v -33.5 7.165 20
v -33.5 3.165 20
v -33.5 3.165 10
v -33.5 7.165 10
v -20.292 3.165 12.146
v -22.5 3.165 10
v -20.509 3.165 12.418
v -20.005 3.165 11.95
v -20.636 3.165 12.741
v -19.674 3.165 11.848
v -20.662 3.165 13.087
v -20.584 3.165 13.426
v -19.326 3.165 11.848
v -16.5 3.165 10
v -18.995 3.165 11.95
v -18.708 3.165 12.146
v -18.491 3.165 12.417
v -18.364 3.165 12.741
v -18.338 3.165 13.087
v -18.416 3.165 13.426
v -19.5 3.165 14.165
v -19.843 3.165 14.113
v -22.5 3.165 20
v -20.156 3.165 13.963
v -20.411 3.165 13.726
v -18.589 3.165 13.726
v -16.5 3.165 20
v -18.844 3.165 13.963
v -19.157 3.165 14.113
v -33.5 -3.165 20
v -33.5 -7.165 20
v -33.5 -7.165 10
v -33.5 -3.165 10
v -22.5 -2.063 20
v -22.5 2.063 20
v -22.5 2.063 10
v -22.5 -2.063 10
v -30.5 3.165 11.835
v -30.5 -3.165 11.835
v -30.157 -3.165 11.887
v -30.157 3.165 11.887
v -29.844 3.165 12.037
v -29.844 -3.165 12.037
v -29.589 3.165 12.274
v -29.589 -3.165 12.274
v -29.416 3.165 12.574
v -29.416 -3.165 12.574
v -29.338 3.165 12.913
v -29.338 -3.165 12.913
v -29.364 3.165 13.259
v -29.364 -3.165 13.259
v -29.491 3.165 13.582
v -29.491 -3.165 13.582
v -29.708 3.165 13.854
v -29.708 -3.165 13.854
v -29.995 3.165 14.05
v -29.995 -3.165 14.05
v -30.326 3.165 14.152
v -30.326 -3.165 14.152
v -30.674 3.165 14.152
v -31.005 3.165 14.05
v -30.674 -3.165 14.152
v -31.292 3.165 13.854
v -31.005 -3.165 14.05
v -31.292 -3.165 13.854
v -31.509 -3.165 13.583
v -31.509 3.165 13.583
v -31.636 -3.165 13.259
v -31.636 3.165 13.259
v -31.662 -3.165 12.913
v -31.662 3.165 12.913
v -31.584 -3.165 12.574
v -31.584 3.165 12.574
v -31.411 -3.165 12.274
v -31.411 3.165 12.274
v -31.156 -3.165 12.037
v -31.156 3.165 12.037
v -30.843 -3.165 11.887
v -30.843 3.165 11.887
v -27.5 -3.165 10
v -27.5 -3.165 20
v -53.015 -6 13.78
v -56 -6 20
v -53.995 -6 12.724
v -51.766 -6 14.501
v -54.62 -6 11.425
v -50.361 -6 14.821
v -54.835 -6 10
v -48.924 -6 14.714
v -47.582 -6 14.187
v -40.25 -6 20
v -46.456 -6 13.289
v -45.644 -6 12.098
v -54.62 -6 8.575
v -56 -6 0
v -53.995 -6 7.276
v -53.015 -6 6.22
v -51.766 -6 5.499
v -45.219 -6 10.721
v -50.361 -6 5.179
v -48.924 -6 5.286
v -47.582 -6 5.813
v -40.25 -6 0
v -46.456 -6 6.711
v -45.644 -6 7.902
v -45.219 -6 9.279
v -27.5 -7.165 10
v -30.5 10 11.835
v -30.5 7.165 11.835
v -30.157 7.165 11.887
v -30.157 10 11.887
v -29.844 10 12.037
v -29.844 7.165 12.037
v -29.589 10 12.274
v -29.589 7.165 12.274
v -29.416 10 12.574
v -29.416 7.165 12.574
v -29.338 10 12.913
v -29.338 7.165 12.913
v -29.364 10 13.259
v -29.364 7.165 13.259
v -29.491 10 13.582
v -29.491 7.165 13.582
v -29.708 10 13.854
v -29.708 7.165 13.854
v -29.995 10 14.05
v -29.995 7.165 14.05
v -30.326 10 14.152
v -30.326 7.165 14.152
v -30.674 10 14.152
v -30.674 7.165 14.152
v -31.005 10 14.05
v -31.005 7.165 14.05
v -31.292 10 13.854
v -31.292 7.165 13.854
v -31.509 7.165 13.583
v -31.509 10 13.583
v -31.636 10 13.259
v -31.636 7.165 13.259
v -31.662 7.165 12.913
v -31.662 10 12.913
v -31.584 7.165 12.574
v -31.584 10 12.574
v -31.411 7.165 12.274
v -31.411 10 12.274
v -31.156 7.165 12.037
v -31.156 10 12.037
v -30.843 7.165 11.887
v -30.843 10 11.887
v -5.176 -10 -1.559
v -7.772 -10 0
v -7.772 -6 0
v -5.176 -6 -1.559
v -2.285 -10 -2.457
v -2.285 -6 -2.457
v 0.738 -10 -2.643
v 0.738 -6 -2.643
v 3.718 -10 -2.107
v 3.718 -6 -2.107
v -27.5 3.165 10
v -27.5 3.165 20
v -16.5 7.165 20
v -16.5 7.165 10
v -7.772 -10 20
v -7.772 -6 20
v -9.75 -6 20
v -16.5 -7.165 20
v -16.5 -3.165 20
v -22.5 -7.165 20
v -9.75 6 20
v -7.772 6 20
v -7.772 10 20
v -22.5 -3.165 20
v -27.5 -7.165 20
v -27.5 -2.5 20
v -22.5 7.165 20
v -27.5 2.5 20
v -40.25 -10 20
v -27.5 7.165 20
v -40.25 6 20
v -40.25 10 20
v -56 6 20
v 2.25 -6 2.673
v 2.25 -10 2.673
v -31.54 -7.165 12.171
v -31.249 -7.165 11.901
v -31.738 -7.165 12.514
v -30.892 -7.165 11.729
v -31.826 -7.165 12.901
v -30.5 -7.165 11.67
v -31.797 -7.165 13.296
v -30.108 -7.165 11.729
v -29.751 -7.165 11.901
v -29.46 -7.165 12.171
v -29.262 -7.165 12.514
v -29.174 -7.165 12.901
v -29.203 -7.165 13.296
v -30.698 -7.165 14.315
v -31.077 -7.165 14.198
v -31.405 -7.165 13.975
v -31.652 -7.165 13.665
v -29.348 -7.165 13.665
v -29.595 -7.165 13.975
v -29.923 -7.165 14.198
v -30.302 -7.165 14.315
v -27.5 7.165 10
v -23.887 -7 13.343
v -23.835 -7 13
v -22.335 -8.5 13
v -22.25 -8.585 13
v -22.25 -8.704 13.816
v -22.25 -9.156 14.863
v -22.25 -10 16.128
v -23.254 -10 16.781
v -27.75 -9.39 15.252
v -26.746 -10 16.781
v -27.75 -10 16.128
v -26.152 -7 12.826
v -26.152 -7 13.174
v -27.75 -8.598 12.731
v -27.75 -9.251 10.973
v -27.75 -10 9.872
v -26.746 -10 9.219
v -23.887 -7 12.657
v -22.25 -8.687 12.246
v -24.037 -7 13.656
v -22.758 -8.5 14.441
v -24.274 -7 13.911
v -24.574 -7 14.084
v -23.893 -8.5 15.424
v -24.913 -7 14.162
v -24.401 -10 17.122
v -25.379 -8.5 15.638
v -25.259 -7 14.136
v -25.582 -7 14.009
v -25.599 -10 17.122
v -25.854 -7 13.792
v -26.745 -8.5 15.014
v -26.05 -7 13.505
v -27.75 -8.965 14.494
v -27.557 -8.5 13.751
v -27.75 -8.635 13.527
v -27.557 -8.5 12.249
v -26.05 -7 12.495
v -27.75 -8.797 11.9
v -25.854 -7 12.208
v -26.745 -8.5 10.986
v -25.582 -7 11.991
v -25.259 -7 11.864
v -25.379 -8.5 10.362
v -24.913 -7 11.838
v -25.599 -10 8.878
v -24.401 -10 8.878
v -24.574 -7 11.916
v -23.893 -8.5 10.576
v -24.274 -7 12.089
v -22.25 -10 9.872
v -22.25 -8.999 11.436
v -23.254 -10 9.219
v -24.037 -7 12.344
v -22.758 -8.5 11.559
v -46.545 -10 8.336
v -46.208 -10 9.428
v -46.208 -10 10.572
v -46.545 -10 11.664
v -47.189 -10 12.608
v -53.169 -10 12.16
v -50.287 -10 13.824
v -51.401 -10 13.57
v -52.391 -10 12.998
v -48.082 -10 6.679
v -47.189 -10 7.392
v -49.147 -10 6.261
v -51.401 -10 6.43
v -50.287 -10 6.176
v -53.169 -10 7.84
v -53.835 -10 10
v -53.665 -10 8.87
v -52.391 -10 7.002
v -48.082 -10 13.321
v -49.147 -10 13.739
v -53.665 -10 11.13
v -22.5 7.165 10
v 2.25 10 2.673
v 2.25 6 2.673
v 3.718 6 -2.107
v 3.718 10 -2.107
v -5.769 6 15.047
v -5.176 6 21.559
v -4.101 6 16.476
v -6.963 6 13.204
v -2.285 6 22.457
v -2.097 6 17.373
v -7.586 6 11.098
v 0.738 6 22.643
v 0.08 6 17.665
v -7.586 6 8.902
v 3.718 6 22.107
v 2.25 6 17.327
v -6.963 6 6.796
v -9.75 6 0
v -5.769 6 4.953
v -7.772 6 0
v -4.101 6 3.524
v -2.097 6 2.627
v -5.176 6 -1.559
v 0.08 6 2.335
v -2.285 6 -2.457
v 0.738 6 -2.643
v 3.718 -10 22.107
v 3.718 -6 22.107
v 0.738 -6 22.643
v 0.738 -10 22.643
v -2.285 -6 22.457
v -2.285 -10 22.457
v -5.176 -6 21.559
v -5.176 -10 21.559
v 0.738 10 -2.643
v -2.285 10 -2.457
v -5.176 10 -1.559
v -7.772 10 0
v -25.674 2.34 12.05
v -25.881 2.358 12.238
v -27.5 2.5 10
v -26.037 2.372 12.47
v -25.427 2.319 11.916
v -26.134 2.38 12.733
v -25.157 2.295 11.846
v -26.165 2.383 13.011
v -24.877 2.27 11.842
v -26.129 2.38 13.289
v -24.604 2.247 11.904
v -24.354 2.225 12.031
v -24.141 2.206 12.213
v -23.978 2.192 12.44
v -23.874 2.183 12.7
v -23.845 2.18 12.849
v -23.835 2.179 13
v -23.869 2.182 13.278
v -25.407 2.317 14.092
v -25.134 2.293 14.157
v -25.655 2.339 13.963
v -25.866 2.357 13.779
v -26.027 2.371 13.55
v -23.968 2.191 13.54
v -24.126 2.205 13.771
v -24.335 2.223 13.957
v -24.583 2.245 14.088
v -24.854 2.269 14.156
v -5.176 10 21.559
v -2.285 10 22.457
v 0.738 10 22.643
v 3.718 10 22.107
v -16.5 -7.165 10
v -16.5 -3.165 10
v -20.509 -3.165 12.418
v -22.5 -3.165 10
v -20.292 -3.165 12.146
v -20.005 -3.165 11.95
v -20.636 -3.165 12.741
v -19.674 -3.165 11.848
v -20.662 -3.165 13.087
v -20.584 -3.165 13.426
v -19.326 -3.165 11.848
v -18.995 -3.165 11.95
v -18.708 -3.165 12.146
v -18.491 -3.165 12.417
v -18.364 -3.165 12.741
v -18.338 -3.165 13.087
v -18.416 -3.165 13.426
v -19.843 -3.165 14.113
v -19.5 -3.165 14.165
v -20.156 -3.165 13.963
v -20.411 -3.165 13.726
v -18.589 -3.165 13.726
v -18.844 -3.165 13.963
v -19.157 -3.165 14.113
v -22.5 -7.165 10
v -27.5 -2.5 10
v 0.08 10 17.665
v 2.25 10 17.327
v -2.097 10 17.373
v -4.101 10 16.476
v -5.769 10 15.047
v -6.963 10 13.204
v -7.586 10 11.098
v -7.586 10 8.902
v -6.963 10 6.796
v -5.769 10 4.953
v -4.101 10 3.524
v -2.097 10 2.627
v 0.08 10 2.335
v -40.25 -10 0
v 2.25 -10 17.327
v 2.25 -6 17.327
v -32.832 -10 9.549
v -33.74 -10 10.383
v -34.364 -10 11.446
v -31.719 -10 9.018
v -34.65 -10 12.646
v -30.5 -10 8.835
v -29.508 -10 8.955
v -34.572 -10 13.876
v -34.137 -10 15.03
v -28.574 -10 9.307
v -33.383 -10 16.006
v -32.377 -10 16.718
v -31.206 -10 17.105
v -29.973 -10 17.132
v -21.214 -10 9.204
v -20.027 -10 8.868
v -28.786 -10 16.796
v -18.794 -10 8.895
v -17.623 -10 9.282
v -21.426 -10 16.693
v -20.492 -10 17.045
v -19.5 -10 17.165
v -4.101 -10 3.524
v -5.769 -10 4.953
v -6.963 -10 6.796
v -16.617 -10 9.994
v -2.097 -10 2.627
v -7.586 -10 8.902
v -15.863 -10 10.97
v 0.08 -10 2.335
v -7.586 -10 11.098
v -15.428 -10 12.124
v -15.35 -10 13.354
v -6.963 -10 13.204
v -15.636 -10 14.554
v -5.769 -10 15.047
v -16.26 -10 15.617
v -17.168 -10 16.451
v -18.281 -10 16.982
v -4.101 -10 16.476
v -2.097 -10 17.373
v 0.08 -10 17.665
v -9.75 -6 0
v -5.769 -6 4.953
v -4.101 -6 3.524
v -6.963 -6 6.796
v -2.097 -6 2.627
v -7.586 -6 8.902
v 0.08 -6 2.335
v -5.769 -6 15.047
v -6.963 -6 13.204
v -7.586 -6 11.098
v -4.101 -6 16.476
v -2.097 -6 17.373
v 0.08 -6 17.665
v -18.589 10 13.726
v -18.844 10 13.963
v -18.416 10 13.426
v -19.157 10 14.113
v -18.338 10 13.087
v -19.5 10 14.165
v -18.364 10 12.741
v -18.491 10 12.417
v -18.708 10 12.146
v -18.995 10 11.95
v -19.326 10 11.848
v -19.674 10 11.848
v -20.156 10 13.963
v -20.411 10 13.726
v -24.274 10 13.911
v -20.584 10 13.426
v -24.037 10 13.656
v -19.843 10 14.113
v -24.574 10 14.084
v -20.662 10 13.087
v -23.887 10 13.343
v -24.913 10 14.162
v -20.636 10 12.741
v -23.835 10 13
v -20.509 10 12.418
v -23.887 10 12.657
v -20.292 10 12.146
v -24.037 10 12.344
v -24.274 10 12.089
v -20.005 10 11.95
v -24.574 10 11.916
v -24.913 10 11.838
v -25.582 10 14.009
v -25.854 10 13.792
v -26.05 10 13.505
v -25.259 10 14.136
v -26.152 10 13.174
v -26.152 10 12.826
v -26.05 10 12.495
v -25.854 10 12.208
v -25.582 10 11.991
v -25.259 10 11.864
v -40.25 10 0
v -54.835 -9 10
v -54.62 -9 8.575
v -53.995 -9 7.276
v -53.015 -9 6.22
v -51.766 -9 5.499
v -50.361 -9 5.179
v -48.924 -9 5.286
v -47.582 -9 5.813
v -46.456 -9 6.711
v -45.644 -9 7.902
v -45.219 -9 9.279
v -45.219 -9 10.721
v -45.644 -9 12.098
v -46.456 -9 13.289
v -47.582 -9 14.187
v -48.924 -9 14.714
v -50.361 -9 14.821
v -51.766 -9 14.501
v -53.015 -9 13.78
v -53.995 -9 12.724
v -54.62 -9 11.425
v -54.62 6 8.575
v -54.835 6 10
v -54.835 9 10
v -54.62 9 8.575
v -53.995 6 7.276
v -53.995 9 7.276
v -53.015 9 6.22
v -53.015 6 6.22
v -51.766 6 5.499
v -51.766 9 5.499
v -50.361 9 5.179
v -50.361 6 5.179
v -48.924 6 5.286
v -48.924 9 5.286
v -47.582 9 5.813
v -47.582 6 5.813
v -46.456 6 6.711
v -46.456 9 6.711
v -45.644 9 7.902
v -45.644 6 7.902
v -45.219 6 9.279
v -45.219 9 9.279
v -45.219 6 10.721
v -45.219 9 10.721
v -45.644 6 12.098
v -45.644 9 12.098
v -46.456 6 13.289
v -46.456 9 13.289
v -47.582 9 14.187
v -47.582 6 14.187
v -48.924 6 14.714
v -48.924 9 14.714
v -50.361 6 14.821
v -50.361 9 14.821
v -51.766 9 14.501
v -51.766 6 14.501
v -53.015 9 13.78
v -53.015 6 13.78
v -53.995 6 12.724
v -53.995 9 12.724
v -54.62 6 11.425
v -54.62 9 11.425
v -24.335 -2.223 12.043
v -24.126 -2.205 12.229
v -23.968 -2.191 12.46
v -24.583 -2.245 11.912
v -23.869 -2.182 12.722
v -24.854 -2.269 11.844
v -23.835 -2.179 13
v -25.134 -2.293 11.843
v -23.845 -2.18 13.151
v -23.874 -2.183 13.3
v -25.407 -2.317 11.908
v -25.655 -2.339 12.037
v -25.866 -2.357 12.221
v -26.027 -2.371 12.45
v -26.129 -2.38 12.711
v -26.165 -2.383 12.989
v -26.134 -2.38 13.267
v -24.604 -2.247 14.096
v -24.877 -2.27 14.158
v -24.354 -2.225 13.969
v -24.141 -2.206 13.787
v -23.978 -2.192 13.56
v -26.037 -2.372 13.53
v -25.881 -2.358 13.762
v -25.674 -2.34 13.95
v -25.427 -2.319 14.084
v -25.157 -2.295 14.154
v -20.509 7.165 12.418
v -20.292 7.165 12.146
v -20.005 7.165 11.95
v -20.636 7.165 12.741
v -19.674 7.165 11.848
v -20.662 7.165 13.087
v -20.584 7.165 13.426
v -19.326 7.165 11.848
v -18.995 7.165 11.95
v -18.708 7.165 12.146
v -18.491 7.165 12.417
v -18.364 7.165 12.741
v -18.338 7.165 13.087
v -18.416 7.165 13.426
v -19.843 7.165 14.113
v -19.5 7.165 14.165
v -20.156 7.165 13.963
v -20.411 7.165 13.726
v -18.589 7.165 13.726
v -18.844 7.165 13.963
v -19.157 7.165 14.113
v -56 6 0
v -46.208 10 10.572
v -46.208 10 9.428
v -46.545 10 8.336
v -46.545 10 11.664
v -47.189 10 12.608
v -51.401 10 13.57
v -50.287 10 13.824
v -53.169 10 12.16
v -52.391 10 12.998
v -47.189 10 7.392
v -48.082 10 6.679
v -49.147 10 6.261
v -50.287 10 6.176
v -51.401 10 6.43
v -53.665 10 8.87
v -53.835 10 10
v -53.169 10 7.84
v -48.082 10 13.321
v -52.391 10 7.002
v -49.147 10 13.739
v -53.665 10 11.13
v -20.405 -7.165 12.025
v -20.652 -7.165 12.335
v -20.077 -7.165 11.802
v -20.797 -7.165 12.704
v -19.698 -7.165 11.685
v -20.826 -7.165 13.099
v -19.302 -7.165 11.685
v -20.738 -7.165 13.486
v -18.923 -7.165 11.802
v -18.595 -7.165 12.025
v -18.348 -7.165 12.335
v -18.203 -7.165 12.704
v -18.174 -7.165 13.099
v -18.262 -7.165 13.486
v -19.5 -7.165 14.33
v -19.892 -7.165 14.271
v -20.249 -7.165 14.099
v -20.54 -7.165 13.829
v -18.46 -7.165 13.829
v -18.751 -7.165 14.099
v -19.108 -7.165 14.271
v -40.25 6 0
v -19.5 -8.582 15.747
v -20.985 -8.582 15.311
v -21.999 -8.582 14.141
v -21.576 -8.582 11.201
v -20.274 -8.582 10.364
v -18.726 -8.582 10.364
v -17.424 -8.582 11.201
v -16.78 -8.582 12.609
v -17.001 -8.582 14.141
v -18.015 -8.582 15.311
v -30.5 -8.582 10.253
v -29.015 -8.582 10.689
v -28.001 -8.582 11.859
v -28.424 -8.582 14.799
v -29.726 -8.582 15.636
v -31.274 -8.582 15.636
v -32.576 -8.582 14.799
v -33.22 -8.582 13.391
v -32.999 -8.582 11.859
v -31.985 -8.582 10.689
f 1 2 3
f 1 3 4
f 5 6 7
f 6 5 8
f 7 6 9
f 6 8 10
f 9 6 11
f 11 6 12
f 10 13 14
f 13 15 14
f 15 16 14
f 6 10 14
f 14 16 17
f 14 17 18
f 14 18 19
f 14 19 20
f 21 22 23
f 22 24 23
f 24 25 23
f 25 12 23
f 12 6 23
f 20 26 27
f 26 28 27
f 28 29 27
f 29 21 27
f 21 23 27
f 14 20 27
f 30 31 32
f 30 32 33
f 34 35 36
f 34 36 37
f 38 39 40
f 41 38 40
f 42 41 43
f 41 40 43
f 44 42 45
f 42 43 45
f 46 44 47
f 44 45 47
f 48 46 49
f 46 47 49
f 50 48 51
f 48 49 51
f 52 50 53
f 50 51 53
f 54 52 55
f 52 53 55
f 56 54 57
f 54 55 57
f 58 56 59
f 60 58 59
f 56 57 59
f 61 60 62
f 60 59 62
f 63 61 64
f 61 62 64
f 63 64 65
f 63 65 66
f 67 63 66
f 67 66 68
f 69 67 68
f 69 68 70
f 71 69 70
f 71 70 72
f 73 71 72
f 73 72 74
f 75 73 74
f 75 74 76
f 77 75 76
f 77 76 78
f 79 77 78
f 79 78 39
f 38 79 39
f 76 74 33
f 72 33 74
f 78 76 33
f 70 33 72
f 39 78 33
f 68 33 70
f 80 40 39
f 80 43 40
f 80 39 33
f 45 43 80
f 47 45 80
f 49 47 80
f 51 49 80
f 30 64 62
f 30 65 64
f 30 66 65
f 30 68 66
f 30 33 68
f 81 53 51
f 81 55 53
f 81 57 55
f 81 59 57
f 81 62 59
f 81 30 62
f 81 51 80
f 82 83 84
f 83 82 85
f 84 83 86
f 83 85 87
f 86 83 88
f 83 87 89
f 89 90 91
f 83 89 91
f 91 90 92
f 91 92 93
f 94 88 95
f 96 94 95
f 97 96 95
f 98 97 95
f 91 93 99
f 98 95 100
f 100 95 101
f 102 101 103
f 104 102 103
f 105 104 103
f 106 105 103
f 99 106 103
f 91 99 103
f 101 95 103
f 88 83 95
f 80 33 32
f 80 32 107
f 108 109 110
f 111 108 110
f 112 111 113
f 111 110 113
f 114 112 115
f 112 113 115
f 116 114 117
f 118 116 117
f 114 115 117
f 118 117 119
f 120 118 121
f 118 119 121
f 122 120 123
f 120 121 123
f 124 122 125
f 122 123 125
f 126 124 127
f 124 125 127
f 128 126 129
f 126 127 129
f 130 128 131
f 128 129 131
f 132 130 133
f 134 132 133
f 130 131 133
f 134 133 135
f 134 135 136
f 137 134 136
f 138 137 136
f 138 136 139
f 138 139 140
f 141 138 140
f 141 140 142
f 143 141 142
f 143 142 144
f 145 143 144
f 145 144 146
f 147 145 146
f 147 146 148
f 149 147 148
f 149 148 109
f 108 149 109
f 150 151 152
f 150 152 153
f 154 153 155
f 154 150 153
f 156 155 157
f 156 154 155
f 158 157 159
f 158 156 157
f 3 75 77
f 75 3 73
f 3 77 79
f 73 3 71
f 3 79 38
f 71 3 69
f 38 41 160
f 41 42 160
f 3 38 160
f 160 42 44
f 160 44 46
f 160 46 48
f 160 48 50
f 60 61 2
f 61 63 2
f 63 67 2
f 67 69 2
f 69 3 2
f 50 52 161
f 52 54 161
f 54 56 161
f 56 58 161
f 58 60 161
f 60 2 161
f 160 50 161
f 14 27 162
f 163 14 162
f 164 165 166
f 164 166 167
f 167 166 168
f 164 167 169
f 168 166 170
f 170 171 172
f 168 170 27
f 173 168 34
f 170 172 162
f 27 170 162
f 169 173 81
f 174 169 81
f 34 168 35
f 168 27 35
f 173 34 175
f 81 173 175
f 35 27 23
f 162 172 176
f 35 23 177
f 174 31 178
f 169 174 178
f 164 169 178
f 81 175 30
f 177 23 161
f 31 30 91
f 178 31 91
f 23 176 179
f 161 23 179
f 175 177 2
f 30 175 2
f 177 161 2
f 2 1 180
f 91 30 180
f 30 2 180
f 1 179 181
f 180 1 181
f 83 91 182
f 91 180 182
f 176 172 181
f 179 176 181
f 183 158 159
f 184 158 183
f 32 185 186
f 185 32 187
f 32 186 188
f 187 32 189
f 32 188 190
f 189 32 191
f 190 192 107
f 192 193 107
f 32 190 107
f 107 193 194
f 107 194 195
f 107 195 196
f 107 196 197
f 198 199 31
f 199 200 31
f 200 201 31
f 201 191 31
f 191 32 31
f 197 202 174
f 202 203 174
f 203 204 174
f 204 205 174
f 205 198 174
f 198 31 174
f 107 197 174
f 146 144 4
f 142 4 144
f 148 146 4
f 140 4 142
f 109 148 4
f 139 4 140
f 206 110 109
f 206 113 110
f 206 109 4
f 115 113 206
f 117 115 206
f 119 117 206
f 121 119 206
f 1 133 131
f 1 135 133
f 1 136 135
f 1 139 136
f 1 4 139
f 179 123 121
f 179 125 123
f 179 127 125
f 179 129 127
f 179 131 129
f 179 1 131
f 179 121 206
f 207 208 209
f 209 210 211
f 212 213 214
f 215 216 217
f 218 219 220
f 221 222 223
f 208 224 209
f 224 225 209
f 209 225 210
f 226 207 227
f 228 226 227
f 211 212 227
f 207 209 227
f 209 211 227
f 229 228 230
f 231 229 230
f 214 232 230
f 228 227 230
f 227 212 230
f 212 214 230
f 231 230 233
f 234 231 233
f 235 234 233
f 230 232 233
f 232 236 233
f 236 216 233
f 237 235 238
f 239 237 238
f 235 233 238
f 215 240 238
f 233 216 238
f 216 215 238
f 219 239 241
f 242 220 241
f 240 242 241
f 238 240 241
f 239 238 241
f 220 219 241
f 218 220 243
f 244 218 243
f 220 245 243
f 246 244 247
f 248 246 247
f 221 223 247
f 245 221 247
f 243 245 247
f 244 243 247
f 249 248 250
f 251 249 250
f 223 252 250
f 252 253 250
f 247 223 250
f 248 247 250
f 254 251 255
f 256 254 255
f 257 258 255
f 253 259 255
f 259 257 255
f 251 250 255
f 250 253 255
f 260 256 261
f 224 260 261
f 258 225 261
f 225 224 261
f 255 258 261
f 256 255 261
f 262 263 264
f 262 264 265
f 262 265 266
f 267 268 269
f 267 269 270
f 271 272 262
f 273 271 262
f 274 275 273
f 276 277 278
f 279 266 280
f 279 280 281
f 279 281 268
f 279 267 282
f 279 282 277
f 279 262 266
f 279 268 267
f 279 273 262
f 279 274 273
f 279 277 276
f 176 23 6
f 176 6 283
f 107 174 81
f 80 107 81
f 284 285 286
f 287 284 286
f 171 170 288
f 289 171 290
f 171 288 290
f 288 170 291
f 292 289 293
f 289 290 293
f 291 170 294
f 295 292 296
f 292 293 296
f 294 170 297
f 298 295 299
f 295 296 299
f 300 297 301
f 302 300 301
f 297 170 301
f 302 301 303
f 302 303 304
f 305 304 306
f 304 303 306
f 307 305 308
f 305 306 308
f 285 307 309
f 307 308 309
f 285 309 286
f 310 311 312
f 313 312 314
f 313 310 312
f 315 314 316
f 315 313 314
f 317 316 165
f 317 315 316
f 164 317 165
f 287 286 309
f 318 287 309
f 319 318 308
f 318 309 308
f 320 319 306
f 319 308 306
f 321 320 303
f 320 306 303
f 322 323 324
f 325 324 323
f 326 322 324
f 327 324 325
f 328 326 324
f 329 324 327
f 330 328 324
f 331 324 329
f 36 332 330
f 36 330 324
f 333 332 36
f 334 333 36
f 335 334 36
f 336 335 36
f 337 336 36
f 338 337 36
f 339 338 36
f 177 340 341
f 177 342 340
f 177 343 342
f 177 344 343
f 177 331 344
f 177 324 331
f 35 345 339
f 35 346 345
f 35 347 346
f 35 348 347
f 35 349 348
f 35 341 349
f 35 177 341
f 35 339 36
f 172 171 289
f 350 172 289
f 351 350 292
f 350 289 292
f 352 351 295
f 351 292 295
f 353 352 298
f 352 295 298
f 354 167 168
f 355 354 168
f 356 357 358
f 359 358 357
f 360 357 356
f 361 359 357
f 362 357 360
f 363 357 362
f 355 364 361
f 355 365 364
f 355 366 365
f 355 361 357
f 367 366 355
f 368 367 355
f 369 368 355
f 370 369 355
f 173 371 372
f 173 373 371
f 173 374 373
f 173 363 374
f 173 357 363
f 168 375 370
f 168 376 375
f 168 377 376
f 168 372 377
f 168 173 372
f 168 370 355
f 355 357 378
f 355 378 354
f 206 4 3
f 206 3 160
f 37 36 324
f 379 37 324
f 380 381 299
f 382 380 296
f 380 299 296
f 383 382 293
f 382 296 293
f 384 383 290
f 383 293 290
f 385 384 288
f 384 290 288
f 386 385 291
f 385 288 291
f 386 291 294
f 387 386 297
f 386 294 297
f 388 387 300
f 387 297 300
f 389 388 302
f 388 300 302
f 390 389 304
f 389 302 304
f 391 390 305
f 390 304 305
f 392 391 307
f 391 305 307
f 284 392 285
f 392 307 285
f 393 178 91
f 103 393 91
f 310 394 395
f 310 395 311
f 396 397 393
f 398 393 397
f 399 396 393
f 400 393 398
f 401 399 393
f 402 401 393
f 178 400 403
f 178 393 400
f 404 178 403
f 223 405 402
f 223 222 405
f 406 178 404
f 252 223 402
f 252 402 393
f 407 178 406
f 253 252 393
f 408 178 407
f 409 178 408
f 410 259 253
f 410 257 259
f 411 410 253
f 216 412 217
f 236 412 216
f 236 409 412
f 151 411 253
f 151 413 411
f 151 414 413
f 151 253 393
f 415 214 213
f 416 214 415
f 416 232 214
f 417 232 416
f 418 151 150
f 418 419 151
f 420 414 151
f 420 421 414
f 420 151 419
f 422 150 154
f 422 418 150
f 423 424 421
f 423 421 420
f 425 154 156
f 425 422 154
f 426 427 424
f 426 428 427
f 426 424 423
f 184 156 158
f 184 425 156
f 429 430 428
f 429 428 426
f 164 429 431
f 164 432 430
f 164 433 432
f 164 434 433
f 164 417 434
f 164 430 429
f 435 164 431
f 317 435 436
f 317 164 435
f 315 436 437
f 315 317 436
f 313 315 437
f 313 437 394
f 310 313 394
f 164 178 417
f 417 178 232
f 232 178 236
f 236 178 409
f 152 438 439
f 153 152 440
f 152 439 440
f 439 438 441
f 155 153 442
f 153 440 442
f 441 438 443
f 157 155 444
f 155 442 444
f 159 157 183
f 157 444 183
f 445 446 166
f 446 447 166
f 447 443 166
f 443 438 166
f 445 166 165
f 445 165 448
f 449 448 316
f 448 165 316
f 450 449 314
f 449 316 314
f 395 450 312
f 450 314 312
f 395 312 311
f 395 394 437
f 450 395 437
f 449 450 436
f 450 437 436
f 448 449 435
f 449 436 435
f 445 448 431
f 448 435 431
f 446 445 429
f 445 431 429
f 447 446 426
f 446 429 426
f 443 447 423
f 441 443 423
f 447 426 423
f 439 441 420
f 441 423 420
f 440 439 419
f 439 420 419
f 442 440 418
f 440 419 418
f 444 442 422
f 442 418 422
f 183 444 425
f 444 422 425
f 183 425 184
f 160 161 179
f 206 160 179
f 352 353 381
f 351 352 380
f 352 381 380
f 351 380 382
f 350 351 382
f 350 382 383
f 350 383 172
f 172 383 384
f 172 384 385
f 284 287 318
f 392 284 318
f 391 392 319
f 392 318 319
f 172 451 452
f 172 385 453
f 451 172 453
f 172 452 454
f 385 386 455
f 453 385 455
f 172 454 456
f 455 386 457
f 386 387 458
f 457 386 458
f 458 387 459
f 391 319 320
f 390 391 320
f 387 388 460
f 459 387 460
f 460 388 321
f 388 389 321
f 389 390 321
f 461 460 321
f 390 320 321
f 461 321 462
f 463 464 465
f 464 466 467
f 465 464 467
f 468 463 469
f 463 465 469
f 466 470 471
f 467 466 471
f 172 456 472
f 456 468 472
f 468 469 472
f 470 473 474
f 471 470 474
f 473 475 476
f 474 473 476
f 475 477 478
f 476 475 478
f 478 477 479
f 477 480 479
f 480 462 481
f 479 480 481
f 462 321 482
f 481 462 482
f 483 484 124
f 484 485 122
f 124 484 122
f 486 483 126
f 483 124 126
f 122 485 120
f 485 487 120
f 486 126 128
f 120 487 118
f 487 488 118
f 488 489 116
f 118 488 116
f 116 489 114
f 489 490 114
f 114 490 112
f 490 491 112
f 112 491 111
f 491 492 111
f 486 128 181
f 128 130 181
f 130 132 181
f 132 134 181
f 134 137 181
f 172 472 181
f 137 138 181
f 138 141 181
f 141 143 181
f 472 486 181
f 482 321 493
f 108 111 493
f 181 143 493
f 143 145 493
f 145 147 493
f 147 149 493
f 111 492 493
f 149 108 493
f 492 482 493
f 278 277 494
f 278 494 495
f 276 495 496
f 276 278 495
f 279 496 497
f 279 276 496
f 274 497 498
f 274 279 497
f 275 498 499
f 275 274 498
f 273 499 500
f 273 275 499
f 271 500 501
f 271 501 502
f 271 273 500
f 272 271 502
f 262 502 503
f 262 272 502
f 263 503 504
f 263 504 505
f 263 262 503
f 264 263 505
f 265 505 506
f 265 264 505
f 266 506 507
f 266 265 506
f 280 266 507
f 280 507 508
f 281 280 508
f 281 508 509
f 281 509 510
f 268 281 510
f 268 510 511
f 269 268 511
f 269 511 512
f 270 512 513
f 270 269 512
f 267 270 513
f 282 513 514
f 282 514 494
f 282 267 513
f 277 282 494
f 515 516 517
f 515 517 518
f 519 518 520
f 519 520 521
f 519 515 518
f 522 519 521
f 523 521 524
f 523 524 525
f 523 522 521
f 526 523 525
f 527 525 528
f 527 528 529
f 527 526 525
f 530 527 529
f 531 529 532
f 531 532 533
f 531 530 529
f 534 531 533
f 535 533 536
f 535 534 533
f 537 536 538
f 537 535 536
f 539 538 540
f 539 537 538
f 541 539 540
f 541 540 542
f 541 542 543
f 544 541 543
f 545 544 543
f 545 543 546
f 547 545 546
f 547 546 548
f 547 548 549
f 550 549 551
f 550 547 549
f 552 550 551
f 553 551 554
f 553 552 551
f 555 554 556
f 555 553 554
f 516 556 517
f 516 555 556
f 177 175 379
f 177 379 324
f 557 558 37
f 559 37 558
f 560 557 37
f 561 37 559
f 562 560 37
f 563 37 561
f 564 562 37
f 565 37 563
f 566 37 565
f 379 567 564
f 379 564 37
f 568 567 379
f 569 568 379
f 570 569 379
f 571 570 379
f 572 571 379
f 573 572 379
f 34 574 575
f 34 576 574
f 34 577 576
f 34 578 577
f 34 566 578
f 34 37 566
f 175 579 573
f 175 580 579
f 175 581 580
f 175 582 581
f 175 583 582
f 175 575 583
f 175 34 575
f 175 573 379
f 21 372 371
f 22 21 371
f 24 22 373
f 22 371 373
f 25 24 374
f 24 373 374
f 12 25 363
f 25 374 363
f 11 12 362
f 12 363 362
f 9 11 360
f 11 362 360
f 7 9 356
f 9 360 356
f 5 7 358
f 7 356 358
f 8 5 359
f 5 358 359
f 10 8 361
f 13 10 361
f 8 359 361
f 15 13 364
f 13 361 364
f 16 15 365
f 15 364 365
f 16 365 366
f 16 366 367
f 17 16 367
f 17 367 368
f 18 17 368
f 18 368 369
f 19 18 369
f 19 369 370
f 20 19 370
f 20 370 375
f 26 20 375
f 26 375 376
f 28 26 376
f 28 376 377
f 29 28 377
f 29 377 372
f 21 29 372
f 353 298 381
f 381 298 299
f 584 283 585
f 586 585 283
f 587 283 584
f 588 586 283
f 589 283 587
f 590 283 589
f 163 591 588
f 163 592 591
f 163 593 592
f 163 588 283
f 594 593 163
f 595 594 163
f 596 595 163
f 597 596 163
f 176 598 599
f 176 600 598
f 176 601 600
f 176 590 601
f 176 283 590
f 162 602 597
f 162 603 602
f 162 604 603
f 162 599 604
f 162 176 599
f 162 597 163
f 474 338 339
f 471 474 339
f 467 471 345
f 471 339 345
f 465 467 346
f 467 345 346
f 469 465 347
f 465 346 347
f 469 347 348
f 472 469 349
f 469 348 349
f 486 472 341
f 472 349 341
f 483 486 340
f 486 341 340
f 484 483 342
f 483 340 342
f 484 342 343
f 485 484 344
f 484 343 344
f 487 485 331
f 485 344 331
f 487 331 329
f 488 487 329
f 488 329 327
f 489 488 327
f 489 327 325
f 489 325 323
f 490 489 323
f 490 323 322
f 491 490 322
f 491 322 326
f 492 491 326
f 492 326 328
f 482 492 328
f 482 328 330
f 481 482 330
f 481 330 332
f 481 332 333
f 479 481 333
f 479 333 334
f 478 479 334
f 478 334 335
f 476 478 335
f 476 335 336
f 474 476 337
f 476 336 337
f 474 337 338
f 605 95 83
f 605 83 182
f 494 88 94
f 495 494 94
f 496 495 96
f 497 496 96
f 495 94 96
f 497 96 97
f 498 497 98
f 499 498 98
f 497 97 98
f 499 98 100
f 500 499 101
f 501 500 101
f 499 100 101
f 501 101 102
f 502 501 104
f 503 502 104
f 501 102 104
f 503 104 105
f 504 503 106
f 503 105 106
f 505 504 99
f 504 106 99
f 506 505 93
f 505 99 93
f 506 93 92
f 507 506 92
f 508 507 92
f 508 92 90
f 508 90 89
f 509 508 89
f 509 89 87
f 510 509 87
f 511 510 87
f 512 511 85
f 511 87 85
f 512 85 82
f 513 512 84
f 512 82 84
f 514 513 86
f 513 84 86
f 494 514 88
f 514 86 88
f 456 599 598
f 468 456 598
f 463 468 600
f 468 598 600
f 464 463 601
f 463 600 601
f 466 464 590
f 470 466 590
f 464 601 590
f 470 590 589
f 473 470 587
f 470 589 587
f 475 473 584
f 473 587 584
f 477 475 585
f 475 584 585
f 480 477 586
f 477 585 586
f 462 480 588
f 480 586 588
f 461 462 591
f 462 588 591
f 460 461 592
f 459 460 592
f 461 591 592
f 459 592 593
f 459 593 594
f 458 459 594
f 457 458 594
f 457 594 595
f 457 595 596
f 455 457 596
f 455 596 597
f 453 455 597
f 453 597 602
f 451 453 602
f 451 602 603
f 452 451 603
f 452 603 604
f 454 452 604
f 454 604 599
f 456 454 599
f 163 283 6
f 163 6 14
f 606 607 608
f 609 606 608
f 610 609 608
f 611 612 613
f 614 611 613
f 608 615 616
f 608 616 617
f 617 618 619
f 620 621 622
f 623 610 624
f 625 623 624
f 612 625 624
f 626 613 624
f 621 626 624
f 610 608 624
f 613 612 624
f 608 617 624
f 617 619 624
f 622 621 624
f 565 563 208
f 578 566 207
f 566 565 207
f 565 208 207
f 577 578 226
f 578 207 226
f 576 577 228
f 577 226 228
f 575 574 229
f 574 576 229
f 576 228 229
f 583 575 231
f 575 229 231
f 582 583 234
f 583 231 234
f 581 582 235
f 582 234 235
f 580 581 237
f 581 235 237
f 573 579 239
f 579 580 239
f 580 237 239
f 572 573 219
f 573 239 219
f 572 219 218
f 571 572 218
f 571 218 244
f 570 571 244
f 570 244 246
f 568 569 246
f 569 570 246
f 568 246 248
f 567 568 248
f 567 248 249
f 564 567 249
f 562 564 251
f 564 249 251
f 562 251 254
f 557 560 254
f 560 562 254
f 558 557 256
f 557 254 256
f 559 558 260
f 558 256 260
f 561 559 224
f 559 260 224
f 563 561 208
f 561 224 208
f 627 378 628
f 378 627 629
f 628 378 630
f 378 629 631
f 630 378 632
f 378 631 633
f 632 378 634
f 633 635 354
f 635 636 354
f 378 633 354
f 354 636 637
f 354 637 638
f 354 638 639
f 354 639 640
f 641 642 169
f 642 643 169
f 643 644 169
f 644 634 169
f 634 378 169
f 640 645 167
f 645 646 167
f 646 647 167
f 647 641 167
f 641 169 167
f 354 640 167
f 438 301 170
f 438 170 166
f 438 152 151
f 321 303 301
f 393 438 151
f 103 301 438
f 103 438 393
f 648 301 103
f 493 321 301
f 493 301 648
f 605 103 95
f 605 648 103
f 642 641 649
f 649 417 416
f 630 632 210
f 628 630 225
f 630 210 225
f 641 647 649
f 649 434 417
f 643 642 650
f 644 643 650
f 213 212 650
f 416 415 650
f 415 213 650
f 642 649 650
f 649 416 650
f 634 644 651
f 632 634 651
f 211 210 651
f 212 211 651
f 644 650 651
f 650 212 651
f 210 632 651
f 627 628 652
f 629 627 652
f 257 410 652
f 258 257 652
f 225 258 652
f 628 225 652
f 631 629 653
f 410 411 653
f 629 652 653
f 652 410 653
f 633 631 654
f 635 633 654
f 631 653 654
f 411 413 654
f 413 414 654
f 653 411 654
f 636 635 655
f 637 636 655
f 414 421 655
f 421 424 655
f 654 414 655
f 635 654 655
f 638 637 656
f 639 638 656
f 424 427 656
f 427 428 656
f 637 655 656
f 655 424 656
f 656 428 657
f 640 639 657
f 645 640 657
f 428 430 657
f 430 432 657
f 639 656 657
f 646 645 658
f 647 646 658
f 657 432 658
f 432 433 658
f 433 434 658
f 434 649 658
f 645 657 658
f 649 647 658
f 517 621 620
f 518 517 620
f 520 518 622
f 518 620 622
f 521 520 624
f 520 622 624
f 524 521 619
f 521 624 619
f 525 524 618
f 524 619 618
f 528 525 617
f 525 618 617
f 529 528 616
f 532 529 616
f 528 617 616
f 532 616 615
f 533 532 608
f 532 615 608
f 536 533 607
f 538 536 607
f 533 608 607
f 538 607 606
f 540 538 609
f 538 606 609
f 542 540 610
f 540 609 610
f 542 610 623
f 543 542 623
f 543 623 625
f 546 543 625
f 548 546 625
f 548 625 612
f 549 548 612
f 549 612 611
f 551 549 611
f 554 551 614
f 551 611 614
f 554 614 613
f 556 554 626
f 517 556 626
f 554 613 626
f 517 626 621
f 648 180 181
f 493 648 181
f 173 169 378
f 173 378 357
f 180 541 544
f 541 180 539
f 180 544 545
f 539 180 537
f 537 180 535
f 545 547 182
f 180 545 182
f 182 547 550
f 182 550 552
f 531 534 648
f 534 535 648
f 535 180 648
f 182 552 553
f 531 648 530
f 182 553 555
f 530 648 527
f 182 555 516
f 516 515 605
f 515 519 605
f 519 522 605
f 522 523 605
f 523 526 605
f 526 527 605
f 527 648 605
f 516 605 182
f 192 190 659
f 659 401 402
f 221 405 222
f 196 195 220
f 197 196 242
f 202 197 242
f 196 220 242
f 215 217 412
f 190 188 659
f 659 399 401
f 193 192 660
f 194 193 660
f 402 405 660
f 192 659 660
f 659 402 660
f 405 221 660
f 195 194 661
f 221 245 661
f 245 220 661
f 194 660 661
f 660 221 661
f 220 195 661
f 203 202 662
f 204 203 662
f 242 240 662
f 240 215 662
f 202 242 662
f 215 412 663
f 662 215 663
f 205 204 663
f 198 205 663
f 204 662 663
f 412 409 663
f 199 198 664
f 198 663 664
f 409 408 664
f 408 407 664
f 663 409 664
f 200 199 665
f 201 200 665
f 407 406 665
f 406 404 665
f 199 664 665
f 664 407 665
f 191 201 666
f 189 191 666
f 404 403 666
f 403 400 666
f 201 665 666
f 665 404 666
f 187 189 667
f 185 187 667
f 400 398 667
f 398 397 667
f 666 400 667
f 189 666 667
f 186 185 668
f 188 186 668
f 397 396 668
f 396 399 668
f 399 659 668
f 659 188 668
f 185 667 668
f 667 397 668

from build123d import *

# Parameters (mm, degrees)
BOSS_EXTRUDE1_DEPTH = 20
SKETCH2_R           = 4.835
BOSS_EXTRUDE2_DEPTH = 4
CUT_EXTRUDE1_REACH  = 64.738
SKETCH3_R           = 7.665
CUT_EXTRUDE2_DEPTH  = 10
SKETCH5_W           = 6
SKETCH5_H           = 4
CUT_EXTRUDE3_DEPTH  = 10
CUT_EXTRUDE4_REACH  = 64.738
SKETCH6_R           = 1.165
BOSS_EXTRUDE4_DEPTH = 4
BOSS_EXTRUDE5_START = -4
BOSS_EXTRUDE5_DEPTH = 4
CHAMFER1_SIZE       = 3
CHAMFER2_SIZE       = 1
CHAMFER3_SIZE       = 1


with BuildPart() as part:
    # Sketch1 → Boss-Extrude1 (new body)
    with BuildSketch(Plane.XY):
        Polygon((-40.25, -10), (-40.25, -6), (-50, -6), (-56, -6), (-56, 6), (-50, 6), (-40.25, 6), (-40.25, 10), (0, 10), (2.25, 10), (2.25, 6), (0, 6), (-9.75, 6), (-9.75, -6), (0, -6), (2.25, -6), (2.25, -10), (0, -10), align=None)
    extrude(amount=BOSS_EXTRUDE1_DEPTH)

    # Sketch2 → Boss-Extrude2 (add)
    with BuildSketch(Plane.XZ.offset(6)):
        with Locations(Location((-50, 10, 0), (0, 0, 180))):
            Circle(SKETCH2_R)
    boss_extrude2 = extrude(amount=BOSS_EXTRUDE2_DEPTH)

    # Cut-Extrude1: up to this face of the body (flat: up to its plane)
    cut_extrude1_end = Plane(part.part.faces().sort_by_distance((-19, 10, 10))[0])
    # Sketch3 → Cut-Extrude1 (cut, up to the picked face)
    with BuildSketch(Plane.XZ.offset(10), mode=Mode.PRIVATE) as cut_extrude1_sk1:
        with Locations((0, 10)):
            Circle(SKETCH3_R)
    cut_extrude1_tool1 = split(extrude(cut_extrude1_sk1.sketch, amount=-CUT_EXTRUDE1_REACH, mode=Mode.PRIVATE), bisect_by=cut_extrude1_end, keep=Keep.BOTH, mode=Mode.PRIVATE)
    add(cut_extrude1_tool1.solids().sort_by(Axis((0, -10, 10), (0, 1, 0)))[0], mode=Mode.SUBTRACT)

    # Mirror1: Boss-Extrude2 across plane
    add(boss_extrude2.mirror(Plane.ZX))

    # Sketch4 → Cut-Extrude2 (cut)
    with BuildSketch(Plane.XY.offset(20)):
        Polygon((-27.5, 2.5), (-22.5, 2.062556682), (-22.5, -2.062556682), (-27.5, -2.5), align=None)
    extrude(amount=-CUT_EXTRUDE2_DEPTH, mode=Mode.SUBTRACT)

    # Sketch5 → Cut-Extrude3 (cut)
    with BuildSketch(Plane.XY.offset(20)):
        with Locations((-30.5, 5.165)):
            Rectangle(SKETCH5_W, SKETCH5_H)
        with Locations((-19.5, 5.165)):
            Rectangle(SKETCH5_W, SKETCH5_H)
        with Locations((-19.5, -5.165)):
            Rectangle(SKETCH5_W, SKETCH5_H)
        with Locations((-30.5, -5.165)):
            Rectangle(SKETCH5_W, SKETCH5_H)
    extrude(amount=-CUT_EXTRUDE3_DEPTH, mode=Mode.SUBTRACT)

    # Cut-Extrude4: up to this face of the body (flat: up to its plane)
    cut_extrude4_end = Plane(part.part.faces().sort_by_distance((-21.952820108, 10, 10))[0])
    # Sketch6 → Cut-Extrude4 (cut, up to the picked face)
    with BuildSketch(Plane.XZ.offset(10), mode=Mode.PRIVATE) as cut_extrude4_sk1:
        with Locations(Location((-30.5, 13, 0), (0, 0, 270))):
            Circle(SKETCH6_R)
    cut_extrude4_tool1 = split(extrude(cut_extrude4_sk1.sketch, amount=-CUT_EXTRUDE4_REACH, mode=Mode.PRIVATE), bisect_by=cut_extrude4_end, keep=Keep.BOTH, mode=Mode.PRIVATE)
    # Sketch6 → Cut-Extrude4 (cut, up to the picked face)
    with BuildSketch(Plane.XZ.offset(10), mode=Mode.PRIVATE) as cut_extrude4_sk2:
        with Locations((-25, 13)):
            Circle(SKETCH6_R)
    cut_extrude4_tool2 = split(extrude(cut_extrude4_sk2.sketch, amount=-CUT_EXTRUDE4_REACH, mode=Mode.PRIVATE), bisect_by=cut_extrude4_end, keep=Keep.BOTH, mode=Mode.PRIVATE)
    # Sketch6 → Cut-Extrude4 (cut, up to the picked face)
    with BuildSketch(Plane.XZ.offset(10), mode=Mode.PRIVATE) as cut_extrude4_sk3:
        with Locations(Location((-19.5, 13, 0), (0, 0, 90))):
            Circle(SKETCH6_R)
    cut_extrude4_tool3 = split(extrude(cut_extrude4_sk3.sketch, amount=-CUT_EXTRUDE4_REACH, mode=Mode.PRIVATE), bisect_by=cut_extrude4_end, keep=Keep.BOTH, mode=Mode.PRIVATE)
    add(cut_extrude4_tool1.solids().sort_by(Axis((-30.5, -10, 13), (0, 1, 0)))[0], mode=Mode.SUBTRACT)
    add(cut_extrude4_tool2.solids().sort_by(Axis((-25, -10, 13), (0, 1, 0)))[0], mode=Mode.SUBTRACT)
    add(cut_extrude4_tool3.solids().sort_by(Axis((-19.5, -10, 13), (0, 1, 0)))[0], mode=Mode.SUBTRACT)

    # Sketch10 → Boss-Extrude4 (add)
    with BuildSketch(Plane.XZ.offset(10)):
        with BuildLine():
            Line((2.25, 17.327327275), (3.717710372, 22.107058049))
            ThreePointArc((3.717710372, 22.107058049), (-12.665, 10), (3.717710372, -2.107058049))
            Line((3.717710372, -2.107058049), (2.25, 2.672672725))
            ThreePointArc((2.25, 2.672672725), (-7.665, 10), (2.25, 17.327327275))
        make_face()
    extrude(amount=-BOSS_EXTRUDE4_DEPTH)

    # Sketch11 → Boss-Extrude5 (add)
    with BuildSketch(Plane(origin=(0, 10, 0), x_dir=(1, 0, 0), z_dir=(0, 1, 0)).offset(BOSS_EXTRUDE5_START)):
        with BuildLine():
            Line((-9.75, -20), (-7.771886837, -20))
            ThreePointArc((-7.771886837, -20), (-2.284515289, -22.457255512), (3.717710372, -22.107058049))
            Line((3.717710372, -22.107058049), (2.25, -17.327327275))
            ThreePointArc((2.25, -17.327327275), (-7.665, -10), (2.25, -2.672672725))
            Line((2.25, -2.672672725), (3.717710372, 2.107058049))
            ThreePointArc((3.717710372, 2.107058049), (-2.284515289, 2.457255512), (-7.771886837, 0))
            Line((-7.771886837, 0), (-9.75, 0))
            Line((-9.75, 0), (-9.75, -20))
        make_face()
    extrude(amount=BOSS_EXTRUDE5_DEPTH)

    # Chamfer1
    # the kernel refuses this chamfer: 3 mm, written as the material it takes off along each edge
    with BuildSketch(Plane(origin=(-30.5, -10, 13), x_dir=(0, 0, -1), z_dir=(-1, 0, 0))) as chamfer1_piece_1:
        Polygon((1.165, -CHAMFER1_SIZE), (1.165 + CHAMFER1_SIZE, 0), (1.165, 0), align=None)
    revolve(axis=Axis((-30.5, -10, 13), (0, -1, 0)), mode=Mode.SUBTRACT)
    with BuildSketch(Plane(origin=(-25, -10, 13), x_dir=(1, 0, 0), z_dir=(0, 0, -1))) as chamfer1_piece_2:
        Polygon((1.165, -CHAMFER1_SIZE), (1.165 + CHAMFER1_SIZE, 0), (1.165, 0), align=None)
    revolve(axis=Axis((-25, -10, 13), (0, -1, 0)), mode=Mode.SUBTRACT)
    with BuildSketch(Plane(origin=(-19.5, -10, 13), x_dir=(0, 0, 1), z_dir=(1, 0, 0))) as chamfer1_piece_3:
        Polygon((1.165, -CHAMFER1_SIZE), (1.165 + CHAMFER1_SIZE, 0), (1.165, 0), align=None)
    revolve(axis=Axis((-19.5, -10, 13), (0, -1, 0)), mode=Mode.SUBTRACT)

    # Chamfer2
    chamfer2_edges = [part.edges().sort_by_distance(p)[0] for p in [
        (-45.165, -10, 10),
    ]]
    chamfer(chamfer2_edges, length=CHAMFER2_SIZE)

    # Chamfer3
    chamfer3_edges = [part.edges().sort_by_distance(p)[0] for p in [
        (-45.165, 10, 10),
    ]]
    chamfer(chamfer3_edges, length=CHAMFER3_SIZE)


solid = part.part
